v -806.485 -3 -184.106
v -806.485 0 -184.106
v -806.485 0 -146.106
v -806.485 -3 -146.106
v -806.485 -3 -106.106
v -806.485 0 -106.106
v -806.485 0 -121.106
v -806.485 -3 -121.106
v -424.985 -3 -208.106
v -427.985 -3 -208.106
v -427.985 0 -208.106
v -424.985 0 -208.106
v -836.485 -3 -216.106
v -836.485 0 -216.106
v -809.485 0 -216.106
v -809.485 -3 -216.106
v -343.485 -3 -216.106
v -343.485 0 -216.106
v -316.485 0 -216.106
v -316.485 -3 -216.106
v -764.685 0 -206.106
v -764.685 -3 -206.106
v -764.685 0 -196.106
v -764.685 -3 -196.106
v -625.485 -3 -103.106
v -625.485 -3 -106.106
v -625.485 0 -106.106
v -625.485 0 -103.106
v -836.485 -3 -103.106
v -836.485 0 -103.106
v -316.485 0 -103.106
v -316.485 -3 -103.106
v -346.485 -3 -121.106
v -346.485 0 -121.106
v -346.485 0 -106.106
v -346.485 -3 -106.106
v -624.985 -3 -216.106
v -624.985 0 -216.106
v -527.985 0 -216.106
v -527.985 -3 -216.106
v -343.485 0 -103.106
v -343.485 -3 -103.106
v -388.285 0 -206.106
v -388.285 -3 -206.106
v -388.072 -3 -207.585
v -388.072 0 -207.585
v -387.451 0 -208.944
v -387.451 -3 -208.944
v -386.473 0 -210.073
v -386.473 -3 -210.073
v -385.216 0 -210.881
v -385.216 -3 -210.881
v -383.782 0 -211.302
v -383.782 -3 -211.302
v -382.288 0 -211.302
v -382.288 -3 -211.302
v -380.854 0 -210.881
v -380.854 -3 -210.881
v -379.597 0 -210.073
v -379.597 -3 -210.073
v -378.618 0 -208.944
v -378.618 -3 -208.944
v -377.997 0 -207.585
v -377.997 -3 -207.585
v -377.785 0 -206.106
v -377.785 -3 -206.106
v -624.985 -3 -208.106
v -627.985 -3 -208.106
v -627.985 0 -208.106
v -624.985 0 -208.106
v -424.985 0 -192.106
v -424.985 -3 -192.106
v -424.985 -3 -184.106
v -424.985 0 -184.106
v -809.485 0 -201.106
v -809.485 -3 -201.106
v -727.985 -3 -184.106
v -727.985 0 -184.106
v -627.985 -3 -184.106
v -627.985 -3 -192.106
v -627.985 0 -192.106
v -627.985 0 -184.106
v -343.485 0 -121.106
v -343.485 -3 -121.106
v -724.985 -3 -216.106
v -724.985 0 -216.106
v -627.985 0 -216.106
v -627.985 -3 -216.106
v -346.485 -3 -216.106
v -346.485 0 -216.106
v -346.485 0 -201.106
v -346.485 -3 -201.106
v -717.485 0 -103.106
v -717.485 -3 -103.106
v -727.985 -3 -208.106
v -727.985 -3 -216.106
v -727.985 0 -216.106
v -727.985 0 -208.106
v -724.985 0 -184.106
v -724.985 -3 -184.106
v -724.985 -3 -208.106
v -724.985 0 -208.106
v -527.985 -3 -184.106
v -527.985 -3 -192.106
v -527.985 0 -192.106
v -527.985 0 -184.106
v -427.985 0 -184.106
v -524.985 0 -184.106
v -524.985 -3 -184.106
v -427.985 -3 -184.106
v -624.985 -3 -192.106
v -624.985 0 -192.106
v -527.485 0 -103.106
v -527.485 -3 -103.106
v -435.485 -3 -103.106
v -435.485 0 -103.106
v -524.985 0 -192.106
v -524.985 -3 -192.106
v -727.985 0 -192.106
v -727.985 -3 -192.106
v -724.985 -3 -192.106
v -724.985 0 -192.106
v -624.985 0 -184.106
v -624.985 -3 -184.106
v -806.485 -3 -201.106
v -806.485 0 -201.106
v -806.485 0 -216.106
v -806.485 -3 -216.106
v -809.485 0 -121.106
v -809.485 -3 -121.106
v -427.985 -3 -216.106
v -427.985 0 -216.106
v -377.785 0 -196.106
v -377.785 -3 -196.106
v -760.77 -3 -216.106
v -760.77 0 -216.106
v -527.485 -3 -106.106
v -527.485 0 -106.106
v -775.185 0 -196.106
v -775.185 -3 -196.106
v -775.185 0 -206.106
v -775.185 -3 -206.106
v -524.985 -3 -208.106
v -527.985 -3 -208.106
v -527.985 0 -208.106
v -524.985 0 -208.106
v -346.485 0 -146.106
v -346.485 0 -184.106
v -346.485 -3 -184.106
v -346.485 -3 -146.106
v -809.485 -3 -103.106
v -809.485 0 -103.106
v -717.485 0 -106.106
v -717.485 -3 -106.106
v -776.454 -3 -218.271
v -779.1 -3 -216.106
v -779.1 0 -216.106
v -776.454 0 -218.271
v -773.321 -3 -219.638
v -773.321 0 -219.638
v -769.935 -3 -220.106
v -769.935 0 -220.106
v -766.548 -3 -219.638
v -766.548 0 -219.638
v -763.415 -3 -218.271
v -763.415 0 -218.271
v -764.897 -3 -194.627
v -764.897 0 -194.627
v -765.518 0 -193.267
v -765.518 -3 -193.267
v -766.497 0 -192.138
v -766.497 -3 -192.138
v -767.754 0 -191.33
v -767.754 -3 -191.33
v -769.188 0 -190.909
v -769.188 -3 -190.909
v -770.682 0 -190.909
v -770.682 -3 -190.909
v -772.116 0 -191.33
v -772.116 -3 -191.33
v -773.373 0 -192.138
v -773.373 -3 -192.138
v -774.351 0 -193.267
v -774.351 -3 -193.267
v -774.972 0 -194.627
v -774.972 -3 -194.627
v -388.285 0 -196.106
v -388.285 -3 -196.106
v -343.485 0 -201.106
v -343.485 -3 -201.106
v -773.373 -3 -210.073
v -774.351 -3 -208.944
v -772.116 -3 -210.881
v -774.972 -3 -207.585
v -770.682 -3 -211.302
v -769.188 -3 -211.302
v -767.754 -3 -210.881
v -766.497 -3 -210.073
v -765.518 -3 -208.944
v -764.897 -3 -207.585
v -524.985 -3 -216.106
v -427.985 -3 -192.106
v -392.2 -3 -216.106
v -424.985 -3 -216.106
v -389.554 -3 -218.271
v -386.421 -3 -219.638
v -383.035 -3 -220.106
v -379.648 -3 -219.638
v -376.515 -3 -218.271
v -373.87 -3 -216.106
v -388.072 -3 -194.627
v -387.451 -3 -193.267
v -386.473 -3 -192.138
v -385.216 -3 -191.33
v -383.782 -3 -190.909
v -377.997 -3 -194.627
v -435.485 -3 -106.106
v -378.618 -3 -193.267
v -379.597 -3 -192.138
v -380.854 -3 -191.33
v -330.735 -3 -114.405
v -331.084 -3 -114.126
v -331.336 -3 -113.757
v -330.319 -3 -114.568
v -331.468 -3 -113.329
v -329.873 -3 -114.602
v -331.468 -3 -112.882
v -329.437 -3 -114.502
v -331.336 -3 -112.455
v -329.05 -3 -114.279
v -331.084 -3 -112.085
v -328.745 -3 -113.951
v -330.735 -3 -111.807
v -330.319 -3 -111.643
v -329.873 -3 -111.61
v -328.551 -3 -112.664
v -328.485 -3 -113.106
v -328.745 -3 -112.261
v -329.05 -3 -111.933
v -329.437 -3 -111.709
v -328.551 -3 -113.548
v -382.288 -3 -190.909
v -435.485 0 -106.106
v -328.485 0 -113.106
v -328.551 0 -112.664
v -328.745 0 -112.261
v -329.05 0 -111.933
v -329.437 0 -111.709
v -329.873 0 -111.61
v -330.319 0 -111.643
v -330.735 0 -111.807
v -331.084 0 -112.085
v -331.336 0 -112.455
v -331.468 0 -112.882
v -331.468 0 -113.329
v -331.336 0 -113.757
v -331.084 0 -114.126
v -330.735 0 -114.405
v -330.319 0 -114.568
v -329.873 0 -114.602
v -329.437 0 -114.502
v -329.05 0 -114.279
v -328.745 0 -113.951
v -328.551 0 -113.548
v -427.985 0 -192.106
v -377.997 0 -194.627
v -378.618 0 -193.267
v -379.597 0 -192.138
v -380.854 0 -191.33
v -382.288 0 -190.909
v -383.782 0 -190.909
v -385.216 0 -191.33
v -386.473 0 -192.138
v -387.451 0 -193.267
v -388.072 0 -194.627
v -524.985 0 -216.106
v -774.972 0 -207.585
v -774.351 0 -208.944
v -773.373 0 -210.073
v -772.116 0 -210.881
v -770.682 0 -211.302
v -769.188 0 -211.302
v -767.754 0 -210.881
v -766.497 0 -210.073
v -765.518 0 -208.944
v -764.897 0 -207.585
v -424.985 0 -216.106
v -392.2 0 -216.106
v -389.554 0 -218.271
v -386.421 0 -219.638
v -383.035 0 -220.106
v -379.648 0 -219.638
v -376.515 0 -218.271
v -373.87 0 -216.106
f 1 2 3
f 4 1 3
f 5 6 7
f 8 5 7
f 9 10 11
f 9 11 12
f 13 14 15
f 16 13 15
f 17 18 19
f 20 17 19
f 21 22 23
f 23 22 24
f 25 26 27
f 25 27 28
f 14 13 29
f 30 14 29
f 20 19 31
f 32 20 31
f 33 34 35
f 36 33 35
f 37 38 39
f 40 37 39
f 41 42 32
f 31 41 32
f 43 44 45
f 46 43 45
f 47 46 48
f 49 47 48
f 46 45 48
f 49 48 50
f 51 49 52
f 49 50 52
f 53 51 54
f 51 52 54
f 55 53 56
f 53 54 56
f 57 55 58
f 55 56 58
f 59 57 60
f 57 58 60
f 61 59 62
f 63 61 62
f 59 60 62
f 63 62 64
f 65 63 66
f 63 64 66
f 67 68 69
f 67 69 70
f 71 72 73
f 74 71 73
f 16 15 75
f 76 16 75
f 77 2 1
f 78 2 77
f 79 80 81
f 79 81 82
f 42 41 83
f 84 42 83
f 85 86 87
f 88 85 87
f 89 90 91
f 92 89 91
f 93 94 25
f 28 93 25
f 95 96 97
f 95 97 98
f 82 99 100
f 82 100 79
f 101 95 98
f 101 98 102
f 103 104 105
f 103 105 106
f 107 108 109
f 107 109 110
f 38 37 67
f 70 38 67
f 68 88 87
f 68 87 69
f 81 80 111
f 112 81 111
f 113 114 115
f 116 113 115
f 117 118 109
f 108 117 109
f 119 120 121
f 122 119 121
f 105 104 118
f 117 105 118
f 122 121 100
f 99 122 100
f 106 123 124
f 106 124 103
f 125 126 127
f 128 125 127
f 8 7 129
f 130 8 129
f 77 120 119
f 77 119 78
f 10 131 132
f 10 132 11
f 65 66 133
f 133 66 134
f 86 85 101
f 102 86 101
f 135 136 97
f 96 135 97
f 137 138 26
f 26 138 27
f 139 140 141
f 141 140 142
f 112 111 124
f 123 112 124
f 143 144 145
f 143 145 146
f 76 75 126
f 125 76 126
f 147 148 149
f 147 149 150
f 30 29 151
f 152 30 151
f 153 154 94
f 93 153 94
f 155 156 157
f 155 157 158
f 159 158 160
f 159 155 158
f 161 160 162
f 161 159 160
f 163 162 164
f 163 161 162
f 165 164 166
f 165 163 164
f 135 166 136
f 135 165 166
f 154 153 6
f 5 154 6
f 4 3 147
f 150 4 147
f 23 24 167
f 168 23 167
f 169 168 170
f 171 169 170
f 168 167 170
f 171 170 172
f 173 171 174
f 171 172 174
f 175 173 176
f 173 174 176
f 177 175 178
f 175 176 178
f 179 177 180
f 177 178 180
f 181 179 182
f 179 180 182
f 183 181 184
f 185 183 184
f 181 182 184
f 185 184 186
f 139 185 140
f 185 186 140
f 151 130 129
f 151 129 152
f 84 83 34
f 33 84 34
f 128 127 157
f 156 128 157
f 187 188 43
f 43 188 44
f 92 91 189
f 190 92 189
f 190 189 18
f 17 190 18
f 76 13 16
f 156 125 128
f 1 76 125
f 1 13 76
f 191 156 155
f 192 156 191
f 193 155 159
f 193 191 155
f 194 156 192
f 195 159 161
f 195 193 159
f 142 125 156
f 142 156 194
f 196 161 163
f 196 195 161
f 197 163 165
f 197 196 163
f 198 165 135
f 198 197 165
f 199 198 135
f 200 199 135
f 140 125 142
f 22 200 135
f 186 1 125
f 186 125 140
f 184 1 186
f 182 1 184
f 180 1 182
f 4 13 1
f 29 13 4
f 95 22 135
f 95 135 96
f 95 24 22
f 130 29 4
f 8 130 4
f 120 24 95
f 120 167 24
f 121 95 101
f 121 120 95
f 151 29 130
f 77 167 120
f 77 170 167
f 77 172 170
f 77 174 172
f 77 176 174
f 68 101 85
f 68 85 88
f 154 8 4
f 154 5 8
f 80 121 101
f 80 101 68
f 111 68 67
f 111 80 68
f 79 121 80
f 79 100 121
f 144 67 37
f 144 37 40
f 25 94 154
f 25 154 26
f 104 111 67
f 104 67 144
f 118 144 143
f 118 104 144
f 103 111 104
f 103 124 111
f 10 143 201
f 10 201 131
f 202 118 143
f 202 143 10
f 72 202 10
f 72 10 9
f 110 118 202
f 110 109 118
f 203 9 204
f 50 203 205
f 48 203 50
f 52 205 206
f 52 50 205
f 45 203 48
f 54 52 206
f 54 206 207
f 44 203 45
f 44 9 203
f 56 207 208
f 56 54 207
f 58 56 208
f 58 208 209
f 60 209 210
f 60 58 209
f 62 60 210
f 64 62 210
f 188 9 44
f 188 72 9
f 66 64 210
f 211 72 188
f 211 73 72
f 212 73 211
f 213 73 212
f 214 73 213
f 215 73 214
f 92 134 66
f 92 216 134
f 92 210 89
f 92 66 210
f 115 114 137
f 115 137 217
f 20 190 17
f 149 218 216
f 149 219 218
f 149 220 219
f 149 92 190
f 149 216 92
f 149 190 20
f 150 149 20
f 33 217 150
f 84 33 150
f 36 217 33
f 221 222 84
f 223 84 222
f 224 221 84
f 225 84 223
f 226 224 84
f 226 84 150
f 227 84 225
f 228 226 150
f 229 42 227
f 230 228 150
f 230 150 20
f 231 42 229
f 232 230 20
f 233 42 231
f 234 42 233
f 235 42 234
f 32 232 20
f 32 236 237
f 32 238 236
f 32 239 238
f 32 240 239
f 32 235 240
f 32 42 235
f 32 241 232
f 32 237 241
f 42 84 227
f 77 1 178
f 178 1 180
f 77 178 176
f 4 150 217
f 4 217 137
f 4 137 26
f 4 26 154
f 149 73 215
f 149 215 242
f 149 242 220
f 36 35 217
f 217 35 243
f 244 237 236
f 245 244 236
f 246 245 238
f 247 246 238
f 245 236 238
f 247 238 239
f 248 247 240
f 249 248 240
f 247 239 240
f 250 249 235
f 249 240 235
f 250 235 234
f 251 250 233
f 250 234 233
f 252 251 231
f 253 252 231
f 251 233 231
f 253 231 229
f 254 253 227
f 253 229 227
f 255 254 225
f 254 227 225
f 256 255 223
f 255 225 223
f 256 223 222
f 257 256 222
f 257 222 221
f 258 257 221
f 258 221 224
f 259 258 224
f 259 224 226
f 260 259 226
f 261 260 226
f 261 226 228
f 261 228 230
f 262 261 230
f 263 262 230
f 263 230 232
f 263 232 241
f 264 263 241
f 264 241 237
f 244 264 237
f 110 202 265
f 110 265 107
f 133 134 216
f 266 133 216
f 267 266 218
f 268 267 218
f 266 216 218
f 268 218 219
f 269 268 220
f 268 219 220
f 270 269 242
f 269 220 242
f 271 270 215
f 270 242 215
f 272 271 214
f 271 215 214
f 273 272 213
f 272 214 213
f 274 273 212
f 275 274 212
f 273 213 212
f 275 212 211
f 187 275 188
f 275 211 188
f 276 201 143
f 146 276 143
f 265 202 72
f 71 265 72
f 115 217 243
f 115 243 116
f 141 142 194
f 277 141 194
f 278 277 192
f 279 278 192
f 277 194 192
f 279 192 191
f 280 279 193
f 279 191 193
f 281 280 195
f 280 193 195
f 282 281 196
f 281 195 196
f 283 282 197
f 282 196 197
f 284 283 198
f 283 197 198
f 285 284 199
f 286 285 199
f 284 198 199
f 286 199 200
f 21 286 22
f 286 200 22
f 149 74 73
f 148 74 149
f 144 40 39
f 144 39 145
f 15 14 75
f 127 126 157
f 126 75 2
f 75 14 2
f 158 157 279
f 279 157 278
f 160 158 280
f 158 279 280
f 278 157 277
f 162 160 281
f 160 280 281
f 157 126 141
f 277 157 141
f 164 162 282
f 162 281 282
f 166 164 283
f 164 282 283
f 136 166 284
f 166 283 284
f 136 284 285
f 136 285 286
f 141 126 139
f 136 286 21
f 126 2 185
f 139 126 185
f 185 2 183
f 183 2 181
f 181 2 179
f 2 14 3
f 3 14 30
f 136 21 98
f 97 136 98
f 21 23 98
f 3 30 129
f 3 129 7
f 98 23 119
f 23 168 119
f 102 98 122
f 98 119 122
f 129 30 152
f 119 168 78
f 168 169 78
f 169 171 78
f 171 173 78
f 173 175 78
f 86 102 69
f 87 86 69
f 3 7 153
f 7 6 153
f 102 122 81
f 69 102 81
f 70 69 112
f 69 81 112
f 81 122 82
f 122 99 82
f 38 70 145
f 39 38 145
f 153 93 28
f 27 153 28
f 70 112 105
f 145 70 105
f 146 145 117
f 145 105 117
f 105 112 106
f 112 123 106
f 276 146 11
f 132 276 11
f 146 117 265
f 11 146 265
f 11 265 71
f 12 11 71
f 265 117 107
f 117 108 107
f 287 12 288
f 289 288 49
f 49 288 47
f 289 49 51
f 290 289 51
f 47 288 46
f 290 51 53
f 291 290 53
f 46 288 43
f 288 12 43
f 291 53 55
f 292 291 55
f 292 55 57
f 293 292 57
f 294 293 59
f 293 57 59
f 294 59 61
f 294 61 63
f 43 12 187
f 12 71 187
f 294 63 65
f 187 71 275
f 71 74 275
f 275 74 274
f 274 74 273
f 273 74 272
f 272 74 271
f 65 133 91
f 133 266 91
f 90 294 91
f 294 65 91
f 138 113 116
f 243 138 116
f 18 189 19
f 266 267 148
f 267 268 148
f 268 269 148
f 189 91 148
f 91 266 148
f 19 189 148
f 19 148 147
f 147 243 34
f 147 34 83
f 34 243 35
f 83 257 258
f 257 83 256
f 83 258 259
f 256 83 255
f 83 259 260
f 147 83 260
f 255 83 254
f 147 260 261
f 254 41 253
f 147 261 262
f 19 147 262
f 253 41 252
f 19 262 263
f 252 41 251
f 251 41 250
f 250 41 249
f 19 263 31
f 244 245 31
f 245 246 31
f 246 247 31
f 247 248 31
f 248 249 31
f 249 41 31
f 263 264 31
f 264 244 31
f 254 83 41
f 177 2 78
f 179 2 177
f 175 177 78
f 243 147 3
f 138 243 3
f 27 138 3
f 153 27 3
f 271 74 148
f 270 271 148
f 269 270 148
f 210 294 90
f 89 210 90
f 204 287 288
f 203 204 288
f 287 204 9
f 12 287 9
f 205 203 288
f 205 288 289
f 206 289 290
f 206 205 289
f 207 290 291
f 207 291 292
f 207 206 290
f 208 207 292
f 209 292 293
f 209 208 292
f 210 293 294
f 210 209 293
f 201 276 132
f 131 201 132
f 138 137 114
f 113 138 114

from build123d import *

# Parameters (mm, degrees)
F0_W     = 460
F0_H     = 38
F1_DEPTH = 3
F2_W     = 27
F2_H     = 3
F2_W_2   = 92
F3_DEPTH = 3
F5_DEPTH = 3
F6_W     = 3
F6_H     = 8
F7_DEPTH = 3
F9_DEPTH = 3
F11_D    = 3


with BuildPart() as f1:
    # F0 (on Front) → F1 (new body)
    with BuildSketch(Plane.XZ):
        Polygon((-343.484793, -216.105753), (-316.484793, -216.105753), (-316.484793, -106.105753), (-343.484793, -106.105753), (-343.484793, -121.105753), (-346.484793, -121.105753), (-346.484793, -106.105753), (-806.484793, -106.105753), (-806.484793, -121.105753), (-809.484793, -121.105753), (-809.484793, -106.105753), (-836.484793, -106.105753), (-836.484793, -216.105753), (-809.484793, -216.105753), (-809.484793, -201.105753), (-806.484793, -201.105753), (-806.484793, -216.105753), (-346.484793, -216.105753), (-346.484793, -201.105753), (-343.484793, -201.105753), align=None)
        with Locations((-576.484793, -165.105753)):
            Rectangle(F0_W, F0_H, mode=Mode.SUBTRACT)
    extrude(amount=F1_DEPTH)

    # F2 (on face) → F3 (join)
    with BuildSketch(Plane.XZ.offset(3)):
        with Locations((-822.984793, -104.605753)):
            Rectangle(F2_W, F2_H)
        with Locations((-329.984793, -104.605753)):
            Rectangle(F2_W, F2_H)
        with Locations((-671.484793, -104.605753)):
            Rectangle(F2_W_2, F2_H)
        with Locations((-481.484793, -104.605753)):
            Rectangle(F2_W_2, F2_H)
    extrude(amount=-F3_DEPTH)

    # F4 (on face) → F5 (cut, through all)
    with BuildSketch(Plane.XZ.offset(3)):
        with BuildLine():
            Line((-377.784793, -206.105753), (-377.784793, -196.105753))
            ThreePointArc((-377.784793, -196.105753), (-383.034793, -190.855753), (-388.284793, -196.105753))
            Line((-388.284793, -196.105753), (-388.284793, -206.105753))
            ThreePointArc((-388.284793, -206.105753), (-383.034793, -211.355753), (-377.784793, -206.105753))
        make_face()
        with BuildLine():
            Line((-764.684793, -206.105753), (-764.684793, -196.105753))
            ThreePointArc((-764.684793, -196.105753), (-769.934793, -190.855753), (-775.184793, -196.105753))
            Line((-775.184793, -196.105753), (-775.184793, -206.105753))
            ThreePointArc((-775.184793, -206.105753), (-769.934793, -211.355753), (-764.684793, -206.105753))
        make_face()
    extrude(amount=-F5_DEPTH, mode=Mode.SUBTRACT)

    # F6 (on face) → F7 (cut)
    with BuildSketch(Plane.XZ.offset(3)):
        with Locations((-726.484793, -212.105753)):
            Rectangle(F6_W, F6_H)
        with Locations((-726.484793, -188.105753)):
            Rectangle(F6_W, F6_H)
        with Locations((-626.484793, -188.105753)):
            Rectangle(F6_W, F6_H)
        with Locations((-626.484793, -212.105753)):
            Rectangle(F6_W, F6_H)
        with Locations((-526.484793, -188.105753)):
            Rectangle(F6_W, F6_H)
        with Locations((-526.484793, -212.105753)):
            Rectangle(F6_W, F6_H)
        with Locations((-426.484793, -188.105753)):
            Rectangle(F6_W, F6_H)
        with Locations((-426.484793, -212.105753)):
            Rectangle(F6_W, F6_H)
    extrude(amount=-F7_DEPTH, mode=Mode.SUBTRACT)

    # F8 (on face) → F9 (join)
    with BuildSketch(Plane.XZ.offset(3)):
        with BuildLine():
            Line((-760.769642, -216.105753), (-779.099944, -216.105753))
            ThreePointArc((-779.099944, -216.105753), (-769.934793, -220.105753), (-760.769642, -216.105753))
        make_face()
        with BuildLine():
            Line((-373.869642, -216.105753), (-392.199944, -216.105753))
            ThreePointArc((-392.199944, -216.105753), (-383.034793, -220.105753), (-373.869642, -216.105753))
        make_face()
    extrude(amount=-F9_DEPTH)

    # F11 (through all)
    with Locations(Plane(origin=(0, 0, 0), x_dir=(-1, 0, 0), z_dir=(0, 1, 0))):
        with Locations((329.984793, -113.105753)):
            Hole(F11_D / 2)


solid = f1.part
